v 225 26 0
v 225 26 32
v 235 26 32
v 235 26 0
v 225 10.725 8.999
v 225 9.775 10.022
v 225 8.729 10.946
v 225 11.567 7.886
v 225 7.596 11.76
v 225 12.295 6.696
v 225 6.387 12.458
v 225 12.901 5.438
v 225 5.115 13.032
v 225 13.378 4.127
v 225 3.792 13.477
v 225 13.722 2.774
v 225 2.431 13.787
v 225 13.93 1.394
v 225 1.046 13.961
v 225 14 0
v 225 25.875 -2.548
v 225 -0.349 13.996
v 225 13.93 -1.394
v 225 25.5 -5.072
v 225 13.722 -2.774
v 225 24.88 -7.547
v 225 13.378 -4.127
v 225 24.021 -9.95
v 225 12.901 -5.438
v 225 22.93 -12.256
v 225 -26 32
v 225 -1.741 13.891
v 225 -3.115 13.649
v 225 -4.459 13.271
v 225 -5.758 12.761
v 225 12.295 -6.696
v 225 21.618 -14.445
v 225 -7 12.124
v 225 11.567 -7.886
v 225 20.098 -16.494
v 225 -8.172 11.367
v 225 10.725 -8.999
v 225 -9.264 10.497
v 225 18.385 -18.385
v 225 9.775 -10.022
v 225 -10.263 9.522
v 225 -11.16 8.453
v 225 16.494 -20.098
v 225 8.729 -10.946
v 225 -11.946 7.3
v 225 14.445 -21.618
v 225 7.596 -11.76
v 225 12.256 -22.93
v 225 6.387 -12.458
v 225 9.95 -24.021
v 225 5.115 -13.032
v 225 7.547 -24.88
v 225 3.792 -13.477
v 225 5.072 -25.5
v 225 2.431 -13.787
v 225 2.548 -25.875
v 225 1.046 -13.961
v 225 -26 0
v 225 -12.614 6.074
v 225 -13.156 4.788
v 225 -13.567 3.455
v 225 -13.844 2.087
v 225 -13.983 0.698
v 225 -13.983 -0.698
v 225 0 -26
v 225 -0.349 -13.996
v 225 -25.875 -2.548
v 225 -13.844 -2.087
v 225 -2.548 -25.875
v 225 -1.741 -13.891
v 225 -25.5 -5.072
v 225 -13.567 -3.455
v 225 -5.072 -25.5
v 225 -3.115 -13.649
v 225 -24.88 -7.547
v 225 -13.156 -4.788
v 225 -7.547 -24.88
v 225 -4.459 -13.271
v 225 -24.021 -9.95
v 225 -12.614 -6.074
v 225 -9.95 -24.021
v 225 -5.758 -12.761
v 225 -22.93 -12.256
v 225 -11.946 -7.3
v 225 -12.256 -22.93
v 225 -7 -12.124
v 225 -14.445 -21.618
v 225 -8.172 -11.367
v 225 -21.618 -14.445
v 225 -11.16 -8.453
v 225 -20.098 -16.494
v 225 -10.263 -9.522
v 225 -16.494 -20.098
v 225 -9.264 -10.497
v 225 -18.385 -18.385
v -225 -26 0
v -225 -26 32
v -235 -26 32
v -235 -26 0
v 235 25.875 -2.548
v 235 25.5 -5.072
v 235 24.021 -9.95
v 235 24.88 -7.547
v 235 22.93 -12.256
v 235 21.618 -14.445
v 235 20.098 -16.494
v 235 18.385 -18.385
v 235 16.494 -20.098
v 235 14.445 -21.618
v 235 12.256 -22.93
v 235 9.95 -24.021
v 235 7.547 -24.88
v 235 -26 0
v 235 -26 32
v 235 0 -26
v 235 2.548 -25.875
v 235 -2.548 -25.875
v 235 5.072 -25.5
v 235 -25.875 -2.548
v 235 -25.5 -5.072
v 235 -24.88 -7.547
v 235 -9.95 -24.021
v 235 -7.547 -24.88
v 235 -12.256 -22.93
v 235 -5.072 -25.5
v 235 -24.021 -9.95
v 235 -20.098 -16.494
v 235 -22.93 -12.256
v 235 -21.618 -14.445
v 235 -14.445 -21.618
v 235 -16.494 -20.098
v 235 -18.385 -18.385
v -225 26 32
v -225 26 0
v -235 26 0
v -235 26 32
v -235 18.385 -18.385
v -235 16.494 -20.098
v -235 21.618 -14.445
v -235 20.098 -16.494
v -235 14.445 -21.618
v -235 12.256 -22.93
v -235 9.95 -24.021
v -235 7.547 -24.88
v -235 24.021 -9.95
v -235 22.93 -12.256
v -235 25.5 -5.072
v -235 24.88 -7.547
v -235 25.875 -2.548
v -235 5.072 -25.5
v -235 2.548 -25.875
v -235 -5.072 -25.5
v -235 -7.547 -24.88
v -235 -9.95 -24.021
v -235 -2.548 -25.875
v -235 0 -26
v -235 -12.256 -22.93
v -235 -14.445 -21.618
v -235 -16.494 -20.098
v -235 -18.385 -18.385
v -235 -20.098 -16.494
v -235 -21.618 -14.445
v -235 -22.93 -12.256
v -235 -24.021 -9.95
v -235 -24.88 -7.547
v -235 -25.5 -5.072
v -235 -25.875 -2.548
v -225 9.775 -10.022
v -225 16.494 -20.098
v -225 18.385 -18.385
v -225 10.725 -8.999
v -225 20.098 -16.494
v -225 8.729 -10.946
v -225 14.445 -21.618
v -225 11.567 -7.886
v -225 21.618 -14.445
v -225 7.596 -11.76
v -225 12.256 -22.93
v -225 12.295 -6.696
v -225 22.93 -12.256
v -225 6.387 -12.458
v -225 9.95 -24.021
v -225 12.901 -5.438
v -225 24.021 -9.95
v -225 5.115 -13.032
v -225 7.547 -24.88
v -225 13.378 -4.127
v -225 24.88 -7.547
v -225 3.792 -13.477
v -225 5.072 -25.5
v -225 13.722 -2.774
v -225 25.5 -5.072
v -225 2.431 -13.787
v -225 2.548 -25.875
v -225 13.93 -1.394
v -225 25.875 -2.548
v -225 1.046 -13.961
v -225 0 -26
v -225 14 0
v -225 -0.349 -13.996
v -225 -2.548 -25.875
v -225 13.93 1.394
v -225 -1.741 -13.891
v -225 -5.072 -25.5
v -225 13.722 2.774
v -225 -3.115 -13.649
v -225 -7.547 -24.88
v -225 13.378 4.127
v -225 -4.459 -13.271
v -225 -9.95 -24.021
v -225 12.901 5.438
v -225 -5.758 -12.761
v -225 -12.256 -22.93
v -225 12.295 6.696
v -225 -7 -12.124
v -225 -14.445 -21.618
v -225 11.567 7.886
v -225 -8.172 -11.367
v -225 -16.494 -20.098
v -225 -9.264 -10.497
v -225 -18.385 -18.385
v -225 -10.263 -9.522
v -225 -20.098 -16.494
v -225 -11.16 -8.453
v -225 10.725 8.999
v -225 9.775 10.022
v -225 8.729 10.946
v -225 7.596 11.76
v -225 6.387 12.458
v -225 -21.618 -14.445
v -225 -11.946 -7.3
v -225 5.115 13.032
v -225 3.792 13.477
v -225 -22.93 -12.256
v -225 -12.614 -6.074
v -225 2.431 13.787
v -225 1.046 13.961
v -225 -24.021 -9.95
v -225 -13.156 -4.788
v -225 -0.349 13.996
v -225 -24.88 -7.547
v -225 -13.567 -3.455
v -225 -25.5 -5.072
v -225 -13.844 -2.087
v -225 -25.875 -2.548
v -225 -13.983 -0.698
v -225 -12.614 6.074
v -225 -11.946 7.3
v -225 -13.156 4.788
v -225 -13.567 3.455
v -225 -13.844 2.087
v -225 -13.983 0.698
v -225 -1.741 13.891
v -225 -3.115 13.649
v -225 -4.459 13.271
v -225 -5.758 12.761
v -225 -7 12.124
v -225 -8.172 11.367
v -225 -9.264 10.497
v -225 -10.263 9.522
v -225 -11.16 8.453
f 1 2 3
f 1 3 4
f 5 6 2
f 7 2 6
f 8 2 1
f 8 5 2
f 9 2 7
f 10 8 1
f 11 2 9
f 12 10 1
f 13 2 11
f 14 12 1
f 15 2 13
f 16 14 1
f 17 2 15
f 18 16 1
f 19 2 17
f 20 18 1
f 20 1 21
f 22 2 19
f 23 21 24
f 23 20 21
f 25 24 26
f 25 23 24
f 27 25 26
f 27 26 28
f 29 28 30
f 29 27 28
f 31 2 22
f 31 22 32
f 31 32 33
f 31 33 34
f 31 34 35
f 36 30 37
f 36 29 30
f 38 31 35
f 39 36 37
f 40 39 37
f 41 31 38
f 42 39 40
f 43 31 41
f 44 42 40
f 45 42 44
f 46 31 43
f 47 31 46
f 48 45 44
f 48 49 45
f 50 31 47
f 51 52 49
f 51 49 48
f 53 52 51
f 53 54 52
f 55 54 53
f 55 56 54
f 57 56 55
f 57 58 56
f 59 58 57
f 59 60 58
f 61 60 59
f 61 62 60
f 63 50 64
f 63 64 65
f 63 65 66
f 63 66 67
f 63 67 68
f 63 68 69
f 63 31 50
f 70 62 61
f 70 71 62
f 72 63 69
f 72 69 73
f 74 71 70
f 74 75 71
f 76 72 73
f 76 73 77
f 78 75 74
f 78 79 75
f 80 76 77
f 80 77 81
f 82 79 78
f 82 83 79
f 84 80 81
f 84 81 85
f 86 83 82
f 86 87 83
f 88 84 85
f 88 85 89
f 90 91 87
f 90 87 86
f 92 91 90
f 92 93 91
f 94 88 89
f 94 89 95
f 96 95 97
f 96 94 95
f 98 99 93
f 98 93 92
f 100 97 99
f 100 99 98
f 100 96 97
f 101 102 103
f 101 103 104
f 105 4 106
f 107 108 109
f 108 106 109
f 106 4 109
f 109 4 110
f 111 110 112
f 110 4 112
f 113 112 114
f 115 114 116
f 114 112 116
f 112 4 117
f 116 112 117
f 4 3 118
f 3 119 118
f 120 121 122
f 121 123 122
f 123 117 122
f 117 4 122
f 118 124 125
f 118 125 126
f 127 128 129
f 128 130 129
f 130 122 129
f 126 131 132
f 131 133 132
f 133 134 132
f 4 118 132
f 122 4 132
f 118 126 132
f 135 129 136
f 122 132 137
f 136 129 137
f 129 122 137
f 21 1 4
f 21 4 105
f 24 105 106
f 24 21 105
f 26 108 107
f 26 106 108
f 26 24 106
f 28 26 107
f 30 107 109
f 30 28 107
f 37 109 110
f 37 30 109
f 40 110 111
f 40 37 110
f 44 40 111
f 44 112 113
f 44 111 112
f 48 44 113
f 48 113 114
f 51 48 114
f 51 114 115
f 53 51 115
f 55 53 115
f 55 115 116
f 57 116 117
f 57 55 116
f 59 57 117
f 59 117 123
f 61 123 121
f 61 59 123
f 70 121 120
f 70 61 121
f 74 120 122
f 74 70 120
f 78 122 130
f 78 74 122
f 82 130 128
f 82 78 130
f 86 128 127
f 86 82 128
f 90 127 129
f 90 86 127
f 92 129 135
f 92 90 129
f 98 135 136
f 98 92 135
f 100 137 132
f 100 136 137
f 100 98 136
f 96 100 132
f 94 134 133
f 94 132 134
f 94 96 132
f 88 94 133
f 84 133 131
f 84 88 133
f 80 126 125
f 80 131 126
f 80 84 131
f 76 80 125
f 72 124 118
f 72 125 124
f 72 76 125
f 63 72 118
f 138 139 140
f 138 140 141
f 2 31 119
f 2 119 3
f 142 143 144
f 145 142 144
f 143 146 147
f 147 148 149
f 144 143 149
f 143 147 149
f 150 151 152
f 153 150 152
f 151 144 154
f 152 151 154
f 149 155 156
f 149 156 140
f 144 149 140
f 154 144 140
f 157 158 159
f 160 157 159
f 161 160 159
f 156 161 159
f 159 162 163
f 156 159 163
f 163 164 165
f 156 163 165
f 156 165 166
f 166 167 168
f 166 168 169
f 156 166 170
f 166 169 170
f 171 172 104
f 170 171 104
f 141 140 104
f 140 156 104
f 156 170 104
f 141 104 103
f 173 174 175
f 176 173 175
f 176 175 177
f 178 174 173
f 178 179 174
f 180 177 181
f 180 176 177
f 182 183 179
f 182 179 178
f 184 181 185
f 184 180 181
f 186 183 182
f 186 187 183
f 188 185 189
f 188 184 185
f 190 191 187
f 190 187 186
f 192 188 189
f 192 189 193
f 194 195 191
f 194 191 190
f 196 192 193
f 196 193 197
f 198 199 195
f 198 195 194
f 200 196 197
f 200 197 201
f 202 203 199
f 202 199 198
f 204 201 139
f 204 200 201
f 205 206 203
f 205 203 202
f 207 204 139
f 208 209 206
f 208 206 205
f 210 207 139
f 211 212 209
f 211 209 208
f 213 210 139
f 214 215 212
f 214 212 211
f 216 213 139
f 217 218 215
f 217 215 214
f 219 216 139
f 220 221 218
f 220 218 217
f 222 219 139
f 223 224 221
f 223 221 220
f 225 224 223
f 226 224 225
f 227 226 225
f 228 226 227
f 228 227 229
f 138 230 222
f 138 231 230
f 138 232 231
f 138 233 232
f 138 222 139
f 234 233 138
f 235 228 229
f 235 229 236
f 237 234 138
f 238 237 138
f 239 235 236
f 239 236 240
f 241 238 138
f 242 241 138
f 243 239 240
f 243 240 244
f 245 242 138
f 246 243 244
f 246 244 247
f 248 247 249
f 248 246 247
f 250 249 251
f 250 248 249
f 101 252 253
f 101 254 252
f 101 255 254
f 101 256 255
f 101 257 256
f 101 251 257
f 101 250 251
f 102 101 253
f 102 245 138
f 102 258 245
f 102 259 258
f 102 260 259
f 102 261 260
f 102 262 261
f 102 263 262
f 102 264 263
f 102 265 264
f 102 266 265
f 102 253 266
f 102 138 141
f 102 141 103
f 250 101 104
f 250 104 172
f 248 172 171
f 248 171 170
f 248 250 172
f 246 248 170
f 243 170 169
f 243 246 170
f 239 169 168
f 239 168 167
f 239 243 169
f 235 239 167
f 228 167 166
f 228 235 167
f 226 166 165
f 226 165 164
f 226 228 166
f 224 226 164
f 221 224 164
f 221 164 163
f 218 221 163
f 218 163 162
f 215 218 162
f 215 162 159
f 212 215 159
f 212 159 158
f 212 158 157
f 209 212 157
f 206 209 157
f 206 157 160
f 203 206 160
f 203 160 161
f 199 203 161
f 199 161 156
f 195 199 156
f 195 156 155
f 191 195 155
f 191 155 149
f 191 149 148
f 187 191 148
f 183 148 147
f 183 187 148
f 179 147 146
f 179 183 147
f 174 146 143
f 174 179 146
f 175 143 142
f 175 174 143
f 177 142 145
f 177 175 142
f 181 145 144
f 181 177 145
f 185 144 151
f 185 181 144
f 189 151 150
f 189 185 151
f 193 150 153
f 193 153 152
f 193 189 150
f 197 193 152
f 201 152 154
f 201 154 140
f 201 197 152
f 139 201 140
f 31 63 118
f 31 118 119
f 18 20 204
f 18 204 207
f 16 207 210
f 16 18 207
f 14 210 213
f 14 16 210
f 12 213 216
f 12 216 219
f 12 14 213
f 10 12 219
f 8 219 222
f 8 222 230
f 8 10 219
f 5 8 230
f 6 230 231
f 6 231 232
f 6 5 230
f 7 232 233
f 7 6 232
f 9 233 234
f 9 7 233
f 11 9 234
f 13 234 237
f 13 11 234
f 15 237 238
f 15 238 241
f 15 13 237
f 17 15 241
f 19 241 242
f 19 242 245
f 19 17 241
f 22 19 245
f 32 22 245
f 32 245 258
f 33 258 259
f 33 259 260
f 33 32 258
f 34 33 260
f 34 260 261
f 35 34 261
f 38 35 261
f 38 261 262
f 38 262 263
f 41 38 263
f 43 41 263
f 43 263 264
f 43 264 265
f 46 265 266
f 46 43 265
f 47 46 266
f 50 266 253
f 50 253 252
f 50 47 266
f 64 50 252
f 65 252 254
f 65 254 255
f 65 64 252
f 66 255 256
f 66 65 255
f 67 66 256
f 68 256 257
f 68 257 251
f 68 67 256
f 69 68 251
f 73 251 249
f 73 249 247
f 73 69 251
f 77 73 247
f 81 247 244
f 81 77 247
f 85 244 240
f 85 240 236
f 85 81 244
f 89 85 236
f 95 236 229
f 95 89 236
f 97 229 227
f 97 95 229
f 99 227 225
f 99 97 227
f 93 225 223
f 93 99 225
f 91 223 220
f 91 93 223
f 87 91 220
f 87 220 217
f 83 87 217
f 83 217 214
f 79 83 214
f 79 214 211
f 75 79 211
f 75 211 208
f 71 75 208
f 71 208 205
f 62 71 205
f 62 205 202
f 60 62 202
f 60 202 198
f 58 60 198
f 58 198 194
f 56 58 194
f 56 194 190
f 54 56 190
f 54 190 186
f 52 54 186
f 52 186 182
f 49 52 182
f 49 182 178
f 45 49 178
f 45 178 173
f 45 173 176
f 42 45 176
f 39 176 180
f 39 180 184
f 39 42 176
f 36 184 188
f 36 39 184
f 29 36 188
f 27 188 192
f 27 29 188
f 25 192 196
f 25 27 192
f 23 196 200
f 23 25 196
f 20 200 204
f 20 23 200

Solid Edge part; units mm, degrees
sketch "Sketch1" plane through (0, 0, 0) normal (1, 0, 0) x (0, 1, 0)
  circle A0 centre (0, 0) radius 14
  dimension "D1" = 28
extrude "Protrusion1" add sketch "Sketch1" along normal mid plane 450
sketch "Sketch2" plane through (225, 0, 0) normal (1, 0, 0) x (0, 1, 0)
  line L0 (-26, 0) -> (-26, 32)
  line L1 (-26, 32) -> (26, 32)
  line L2 (26, 32) -> (26, 0)
  arc A0 (-26, 0) -> (26, 0) centre (0, 0) ccw
  dimension "D1" = 26
  dimension "D2" = 26
  dimension "D3" = 32
extrude "Protrusion2" add sketch "Sketch2" along normal blind 10
mirror "Mirror1" about plane through (0, 0, 0) normal (1, 0, 0) of "Protrusion2"
